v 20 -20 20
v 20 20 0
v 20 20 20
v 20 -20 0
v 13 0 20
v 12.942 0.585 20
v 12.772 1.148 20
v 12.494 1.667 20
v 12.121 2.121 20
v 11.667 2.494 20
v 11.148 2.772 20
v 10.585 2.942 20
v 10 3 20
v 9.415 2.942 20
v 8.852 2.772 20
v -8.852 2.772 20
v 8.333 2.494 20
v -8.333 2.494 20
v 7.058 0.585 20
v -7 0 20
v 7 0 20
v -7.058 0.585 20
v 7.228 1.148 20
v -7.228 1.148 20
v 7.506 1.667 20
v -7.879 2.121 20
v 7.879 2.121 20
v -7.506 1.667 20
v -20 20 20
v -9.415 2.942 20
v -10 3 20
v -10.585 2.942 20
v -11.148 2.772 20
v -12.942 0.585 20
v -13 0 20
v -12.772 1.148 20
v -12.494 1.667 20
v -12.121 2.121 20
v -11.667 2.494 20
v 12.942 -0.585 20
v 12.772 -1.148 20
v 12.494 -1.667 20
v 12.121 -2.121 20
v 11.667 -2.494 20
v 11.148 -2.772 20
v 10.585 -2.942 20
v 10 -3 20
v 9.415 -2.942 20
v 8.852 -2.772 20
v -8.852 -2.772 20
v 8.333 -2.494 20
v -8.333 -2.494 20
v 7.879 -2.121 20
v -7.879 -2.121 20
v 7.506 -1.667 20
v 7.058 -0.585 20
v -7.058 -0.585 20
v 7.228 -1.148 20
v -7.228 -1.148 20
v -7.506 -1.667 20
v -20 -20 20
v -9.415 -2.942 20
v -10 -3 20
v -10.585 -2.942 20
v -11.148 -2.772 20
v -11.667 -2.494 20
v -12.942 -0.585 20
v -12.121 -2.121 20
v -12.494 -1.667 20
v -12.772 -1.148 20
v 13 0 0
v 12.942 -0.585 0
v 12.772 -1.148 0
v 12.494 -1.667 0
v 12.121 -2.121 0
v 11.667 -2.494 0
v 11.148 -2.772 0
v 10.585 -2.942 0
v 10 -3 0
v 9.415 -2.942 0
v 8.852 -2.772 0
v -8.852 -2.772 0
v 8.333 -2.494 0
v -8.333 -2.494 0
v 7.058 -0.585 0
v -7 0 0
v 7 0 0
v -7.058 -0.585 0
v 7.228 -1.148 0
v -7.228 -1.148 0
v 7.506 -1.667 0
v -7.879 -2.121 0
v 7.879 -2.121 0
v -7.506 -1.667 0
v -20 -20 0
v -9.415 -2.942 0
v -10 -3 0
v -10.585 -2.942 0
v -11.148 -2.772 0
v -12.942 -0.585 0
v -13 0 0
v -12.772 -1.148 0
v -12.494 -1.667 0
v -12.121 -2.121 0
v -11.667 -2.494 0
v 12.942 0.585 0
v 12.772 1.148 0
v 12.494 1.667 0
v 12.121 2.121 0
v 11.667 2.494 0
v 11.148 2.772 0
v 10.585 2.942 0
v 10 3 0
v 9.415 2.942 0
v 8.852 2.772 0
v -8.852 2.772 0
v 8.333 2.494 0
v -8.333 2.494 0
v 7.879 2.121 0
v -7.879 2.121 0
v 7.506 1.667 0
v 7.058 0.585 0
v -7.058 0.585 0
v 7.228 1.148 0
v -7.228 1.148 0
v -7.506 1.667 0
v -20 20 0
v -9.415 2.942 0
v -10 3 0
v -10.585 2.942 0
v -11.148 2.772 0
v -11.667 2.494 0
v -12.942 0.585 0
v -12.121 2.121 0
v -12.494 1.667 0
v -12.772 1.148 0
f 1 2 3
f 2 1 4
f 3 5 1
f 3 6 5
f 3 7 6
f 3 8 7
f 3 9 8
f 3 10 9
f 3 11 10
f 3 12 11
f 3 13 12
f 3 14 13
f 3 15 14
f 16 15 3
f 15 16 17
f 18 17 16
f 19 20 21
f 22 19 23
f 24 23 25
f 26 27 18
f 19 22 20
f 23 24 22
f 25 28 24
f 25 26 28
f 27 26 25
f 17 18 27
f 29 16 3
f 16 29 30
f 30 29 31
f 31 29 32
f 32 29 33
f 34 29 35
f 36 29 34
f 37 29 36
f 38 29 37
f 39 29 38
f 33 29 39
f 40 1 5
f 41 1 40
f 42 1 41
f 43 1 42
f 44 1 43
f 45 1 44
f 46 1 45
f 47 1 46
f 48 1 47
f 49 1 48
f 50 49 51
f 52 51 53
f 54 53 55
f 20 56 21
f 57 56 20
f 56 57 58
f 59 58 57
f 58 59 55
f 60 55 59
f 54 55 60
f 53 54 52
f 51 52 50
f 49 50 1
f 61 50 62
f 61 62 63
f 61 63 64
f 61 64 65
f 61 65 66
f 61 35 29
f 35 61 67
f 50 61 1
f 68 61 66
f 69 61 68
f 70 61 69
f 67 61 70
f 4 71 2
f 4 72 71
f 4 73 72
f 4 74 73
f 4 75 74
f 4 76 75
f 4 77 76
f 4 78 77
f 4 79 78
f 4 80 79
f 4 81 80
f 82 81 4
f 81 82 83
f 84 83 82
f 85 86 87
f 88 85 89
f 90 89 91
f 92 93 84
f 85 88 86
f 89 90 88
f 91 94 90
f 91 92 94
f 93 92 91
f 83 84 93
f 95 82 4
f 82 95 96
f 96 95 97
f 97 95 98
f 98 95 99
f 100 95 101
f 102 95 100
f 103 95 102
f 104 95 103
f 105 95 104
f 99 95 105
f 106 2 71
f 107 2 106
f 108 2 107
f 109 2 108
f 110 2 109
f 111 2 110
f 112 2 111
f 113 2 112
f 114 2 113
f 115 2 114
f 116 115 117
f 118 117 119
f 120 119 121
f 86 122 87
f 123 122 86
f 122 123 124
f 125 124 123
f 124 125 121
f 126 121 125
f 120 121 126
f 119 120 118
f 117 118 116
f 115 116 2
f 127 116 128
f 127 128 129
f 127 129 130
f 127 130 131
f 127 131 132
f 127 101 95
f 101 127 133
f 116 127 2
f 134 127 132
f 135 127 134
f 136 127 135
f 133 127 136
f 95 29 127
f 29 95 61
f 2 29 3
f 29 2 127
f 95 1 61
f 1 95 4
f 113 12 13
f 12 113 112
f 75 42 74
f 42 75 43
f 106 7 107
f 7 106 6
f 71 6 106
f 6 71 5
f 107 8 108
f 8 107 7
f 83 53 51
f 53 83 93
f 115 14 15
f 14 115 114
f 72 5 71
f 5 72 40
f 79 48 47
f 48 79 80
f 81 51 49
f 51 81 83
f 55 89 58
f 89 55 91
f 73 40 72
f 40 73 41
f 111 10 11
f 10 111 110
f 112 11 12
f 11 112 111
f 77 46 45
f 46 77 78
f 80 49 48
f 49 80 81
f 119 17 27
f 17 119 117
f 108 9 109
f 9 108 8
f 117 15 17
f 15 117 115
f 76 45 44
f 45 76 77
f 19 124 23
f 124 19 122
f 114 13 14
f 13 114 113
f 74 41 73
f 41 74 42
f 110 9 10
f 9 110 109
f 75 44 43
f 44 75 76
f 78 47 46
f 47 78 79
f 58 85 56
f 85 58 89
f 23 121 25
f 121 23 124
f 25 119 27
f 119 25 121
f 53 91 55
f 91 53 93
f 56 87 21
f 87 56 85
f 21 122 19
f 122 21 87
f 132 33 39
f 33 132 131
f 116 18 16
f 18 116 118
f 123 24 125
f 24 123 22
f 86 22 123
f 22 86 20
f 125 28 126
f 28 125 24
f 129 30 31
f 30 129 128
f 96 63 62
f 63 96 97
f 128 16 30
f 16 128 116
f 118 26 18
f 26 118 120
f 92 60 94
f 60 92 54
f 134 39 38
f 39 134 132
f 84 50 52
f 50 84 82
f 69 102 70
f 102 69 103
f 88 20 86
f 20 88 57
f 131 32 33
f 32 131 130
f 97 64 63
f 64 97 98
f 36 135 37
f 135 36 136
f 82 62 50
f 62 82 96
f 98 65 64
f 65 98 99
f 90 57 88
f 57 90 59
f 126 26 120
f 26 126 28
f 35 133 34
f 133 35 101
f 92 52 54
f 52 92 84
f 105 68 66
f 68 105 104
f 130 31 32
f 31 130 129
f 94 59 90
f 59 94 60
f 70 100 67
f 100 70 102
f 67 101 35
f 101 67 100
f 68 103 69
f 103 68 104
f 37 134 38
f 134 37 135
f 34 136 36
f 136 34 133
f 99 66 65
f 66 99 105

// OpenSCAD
// Generated by scadwright. Do not hand-edit —
// edit the Python source and regenerate.

$fn = 32;

difference() {
    translate([-20, -20, 0]) {
        cube([40, 40, 20], center=false);
    }
    translate([10, 0, 0]) {
        cylinder(h=22, r=3, center=false);
    }
    translate([-10, 0, 0]) {
        cylinder(h=22, r=3, center=false);
    }
}
